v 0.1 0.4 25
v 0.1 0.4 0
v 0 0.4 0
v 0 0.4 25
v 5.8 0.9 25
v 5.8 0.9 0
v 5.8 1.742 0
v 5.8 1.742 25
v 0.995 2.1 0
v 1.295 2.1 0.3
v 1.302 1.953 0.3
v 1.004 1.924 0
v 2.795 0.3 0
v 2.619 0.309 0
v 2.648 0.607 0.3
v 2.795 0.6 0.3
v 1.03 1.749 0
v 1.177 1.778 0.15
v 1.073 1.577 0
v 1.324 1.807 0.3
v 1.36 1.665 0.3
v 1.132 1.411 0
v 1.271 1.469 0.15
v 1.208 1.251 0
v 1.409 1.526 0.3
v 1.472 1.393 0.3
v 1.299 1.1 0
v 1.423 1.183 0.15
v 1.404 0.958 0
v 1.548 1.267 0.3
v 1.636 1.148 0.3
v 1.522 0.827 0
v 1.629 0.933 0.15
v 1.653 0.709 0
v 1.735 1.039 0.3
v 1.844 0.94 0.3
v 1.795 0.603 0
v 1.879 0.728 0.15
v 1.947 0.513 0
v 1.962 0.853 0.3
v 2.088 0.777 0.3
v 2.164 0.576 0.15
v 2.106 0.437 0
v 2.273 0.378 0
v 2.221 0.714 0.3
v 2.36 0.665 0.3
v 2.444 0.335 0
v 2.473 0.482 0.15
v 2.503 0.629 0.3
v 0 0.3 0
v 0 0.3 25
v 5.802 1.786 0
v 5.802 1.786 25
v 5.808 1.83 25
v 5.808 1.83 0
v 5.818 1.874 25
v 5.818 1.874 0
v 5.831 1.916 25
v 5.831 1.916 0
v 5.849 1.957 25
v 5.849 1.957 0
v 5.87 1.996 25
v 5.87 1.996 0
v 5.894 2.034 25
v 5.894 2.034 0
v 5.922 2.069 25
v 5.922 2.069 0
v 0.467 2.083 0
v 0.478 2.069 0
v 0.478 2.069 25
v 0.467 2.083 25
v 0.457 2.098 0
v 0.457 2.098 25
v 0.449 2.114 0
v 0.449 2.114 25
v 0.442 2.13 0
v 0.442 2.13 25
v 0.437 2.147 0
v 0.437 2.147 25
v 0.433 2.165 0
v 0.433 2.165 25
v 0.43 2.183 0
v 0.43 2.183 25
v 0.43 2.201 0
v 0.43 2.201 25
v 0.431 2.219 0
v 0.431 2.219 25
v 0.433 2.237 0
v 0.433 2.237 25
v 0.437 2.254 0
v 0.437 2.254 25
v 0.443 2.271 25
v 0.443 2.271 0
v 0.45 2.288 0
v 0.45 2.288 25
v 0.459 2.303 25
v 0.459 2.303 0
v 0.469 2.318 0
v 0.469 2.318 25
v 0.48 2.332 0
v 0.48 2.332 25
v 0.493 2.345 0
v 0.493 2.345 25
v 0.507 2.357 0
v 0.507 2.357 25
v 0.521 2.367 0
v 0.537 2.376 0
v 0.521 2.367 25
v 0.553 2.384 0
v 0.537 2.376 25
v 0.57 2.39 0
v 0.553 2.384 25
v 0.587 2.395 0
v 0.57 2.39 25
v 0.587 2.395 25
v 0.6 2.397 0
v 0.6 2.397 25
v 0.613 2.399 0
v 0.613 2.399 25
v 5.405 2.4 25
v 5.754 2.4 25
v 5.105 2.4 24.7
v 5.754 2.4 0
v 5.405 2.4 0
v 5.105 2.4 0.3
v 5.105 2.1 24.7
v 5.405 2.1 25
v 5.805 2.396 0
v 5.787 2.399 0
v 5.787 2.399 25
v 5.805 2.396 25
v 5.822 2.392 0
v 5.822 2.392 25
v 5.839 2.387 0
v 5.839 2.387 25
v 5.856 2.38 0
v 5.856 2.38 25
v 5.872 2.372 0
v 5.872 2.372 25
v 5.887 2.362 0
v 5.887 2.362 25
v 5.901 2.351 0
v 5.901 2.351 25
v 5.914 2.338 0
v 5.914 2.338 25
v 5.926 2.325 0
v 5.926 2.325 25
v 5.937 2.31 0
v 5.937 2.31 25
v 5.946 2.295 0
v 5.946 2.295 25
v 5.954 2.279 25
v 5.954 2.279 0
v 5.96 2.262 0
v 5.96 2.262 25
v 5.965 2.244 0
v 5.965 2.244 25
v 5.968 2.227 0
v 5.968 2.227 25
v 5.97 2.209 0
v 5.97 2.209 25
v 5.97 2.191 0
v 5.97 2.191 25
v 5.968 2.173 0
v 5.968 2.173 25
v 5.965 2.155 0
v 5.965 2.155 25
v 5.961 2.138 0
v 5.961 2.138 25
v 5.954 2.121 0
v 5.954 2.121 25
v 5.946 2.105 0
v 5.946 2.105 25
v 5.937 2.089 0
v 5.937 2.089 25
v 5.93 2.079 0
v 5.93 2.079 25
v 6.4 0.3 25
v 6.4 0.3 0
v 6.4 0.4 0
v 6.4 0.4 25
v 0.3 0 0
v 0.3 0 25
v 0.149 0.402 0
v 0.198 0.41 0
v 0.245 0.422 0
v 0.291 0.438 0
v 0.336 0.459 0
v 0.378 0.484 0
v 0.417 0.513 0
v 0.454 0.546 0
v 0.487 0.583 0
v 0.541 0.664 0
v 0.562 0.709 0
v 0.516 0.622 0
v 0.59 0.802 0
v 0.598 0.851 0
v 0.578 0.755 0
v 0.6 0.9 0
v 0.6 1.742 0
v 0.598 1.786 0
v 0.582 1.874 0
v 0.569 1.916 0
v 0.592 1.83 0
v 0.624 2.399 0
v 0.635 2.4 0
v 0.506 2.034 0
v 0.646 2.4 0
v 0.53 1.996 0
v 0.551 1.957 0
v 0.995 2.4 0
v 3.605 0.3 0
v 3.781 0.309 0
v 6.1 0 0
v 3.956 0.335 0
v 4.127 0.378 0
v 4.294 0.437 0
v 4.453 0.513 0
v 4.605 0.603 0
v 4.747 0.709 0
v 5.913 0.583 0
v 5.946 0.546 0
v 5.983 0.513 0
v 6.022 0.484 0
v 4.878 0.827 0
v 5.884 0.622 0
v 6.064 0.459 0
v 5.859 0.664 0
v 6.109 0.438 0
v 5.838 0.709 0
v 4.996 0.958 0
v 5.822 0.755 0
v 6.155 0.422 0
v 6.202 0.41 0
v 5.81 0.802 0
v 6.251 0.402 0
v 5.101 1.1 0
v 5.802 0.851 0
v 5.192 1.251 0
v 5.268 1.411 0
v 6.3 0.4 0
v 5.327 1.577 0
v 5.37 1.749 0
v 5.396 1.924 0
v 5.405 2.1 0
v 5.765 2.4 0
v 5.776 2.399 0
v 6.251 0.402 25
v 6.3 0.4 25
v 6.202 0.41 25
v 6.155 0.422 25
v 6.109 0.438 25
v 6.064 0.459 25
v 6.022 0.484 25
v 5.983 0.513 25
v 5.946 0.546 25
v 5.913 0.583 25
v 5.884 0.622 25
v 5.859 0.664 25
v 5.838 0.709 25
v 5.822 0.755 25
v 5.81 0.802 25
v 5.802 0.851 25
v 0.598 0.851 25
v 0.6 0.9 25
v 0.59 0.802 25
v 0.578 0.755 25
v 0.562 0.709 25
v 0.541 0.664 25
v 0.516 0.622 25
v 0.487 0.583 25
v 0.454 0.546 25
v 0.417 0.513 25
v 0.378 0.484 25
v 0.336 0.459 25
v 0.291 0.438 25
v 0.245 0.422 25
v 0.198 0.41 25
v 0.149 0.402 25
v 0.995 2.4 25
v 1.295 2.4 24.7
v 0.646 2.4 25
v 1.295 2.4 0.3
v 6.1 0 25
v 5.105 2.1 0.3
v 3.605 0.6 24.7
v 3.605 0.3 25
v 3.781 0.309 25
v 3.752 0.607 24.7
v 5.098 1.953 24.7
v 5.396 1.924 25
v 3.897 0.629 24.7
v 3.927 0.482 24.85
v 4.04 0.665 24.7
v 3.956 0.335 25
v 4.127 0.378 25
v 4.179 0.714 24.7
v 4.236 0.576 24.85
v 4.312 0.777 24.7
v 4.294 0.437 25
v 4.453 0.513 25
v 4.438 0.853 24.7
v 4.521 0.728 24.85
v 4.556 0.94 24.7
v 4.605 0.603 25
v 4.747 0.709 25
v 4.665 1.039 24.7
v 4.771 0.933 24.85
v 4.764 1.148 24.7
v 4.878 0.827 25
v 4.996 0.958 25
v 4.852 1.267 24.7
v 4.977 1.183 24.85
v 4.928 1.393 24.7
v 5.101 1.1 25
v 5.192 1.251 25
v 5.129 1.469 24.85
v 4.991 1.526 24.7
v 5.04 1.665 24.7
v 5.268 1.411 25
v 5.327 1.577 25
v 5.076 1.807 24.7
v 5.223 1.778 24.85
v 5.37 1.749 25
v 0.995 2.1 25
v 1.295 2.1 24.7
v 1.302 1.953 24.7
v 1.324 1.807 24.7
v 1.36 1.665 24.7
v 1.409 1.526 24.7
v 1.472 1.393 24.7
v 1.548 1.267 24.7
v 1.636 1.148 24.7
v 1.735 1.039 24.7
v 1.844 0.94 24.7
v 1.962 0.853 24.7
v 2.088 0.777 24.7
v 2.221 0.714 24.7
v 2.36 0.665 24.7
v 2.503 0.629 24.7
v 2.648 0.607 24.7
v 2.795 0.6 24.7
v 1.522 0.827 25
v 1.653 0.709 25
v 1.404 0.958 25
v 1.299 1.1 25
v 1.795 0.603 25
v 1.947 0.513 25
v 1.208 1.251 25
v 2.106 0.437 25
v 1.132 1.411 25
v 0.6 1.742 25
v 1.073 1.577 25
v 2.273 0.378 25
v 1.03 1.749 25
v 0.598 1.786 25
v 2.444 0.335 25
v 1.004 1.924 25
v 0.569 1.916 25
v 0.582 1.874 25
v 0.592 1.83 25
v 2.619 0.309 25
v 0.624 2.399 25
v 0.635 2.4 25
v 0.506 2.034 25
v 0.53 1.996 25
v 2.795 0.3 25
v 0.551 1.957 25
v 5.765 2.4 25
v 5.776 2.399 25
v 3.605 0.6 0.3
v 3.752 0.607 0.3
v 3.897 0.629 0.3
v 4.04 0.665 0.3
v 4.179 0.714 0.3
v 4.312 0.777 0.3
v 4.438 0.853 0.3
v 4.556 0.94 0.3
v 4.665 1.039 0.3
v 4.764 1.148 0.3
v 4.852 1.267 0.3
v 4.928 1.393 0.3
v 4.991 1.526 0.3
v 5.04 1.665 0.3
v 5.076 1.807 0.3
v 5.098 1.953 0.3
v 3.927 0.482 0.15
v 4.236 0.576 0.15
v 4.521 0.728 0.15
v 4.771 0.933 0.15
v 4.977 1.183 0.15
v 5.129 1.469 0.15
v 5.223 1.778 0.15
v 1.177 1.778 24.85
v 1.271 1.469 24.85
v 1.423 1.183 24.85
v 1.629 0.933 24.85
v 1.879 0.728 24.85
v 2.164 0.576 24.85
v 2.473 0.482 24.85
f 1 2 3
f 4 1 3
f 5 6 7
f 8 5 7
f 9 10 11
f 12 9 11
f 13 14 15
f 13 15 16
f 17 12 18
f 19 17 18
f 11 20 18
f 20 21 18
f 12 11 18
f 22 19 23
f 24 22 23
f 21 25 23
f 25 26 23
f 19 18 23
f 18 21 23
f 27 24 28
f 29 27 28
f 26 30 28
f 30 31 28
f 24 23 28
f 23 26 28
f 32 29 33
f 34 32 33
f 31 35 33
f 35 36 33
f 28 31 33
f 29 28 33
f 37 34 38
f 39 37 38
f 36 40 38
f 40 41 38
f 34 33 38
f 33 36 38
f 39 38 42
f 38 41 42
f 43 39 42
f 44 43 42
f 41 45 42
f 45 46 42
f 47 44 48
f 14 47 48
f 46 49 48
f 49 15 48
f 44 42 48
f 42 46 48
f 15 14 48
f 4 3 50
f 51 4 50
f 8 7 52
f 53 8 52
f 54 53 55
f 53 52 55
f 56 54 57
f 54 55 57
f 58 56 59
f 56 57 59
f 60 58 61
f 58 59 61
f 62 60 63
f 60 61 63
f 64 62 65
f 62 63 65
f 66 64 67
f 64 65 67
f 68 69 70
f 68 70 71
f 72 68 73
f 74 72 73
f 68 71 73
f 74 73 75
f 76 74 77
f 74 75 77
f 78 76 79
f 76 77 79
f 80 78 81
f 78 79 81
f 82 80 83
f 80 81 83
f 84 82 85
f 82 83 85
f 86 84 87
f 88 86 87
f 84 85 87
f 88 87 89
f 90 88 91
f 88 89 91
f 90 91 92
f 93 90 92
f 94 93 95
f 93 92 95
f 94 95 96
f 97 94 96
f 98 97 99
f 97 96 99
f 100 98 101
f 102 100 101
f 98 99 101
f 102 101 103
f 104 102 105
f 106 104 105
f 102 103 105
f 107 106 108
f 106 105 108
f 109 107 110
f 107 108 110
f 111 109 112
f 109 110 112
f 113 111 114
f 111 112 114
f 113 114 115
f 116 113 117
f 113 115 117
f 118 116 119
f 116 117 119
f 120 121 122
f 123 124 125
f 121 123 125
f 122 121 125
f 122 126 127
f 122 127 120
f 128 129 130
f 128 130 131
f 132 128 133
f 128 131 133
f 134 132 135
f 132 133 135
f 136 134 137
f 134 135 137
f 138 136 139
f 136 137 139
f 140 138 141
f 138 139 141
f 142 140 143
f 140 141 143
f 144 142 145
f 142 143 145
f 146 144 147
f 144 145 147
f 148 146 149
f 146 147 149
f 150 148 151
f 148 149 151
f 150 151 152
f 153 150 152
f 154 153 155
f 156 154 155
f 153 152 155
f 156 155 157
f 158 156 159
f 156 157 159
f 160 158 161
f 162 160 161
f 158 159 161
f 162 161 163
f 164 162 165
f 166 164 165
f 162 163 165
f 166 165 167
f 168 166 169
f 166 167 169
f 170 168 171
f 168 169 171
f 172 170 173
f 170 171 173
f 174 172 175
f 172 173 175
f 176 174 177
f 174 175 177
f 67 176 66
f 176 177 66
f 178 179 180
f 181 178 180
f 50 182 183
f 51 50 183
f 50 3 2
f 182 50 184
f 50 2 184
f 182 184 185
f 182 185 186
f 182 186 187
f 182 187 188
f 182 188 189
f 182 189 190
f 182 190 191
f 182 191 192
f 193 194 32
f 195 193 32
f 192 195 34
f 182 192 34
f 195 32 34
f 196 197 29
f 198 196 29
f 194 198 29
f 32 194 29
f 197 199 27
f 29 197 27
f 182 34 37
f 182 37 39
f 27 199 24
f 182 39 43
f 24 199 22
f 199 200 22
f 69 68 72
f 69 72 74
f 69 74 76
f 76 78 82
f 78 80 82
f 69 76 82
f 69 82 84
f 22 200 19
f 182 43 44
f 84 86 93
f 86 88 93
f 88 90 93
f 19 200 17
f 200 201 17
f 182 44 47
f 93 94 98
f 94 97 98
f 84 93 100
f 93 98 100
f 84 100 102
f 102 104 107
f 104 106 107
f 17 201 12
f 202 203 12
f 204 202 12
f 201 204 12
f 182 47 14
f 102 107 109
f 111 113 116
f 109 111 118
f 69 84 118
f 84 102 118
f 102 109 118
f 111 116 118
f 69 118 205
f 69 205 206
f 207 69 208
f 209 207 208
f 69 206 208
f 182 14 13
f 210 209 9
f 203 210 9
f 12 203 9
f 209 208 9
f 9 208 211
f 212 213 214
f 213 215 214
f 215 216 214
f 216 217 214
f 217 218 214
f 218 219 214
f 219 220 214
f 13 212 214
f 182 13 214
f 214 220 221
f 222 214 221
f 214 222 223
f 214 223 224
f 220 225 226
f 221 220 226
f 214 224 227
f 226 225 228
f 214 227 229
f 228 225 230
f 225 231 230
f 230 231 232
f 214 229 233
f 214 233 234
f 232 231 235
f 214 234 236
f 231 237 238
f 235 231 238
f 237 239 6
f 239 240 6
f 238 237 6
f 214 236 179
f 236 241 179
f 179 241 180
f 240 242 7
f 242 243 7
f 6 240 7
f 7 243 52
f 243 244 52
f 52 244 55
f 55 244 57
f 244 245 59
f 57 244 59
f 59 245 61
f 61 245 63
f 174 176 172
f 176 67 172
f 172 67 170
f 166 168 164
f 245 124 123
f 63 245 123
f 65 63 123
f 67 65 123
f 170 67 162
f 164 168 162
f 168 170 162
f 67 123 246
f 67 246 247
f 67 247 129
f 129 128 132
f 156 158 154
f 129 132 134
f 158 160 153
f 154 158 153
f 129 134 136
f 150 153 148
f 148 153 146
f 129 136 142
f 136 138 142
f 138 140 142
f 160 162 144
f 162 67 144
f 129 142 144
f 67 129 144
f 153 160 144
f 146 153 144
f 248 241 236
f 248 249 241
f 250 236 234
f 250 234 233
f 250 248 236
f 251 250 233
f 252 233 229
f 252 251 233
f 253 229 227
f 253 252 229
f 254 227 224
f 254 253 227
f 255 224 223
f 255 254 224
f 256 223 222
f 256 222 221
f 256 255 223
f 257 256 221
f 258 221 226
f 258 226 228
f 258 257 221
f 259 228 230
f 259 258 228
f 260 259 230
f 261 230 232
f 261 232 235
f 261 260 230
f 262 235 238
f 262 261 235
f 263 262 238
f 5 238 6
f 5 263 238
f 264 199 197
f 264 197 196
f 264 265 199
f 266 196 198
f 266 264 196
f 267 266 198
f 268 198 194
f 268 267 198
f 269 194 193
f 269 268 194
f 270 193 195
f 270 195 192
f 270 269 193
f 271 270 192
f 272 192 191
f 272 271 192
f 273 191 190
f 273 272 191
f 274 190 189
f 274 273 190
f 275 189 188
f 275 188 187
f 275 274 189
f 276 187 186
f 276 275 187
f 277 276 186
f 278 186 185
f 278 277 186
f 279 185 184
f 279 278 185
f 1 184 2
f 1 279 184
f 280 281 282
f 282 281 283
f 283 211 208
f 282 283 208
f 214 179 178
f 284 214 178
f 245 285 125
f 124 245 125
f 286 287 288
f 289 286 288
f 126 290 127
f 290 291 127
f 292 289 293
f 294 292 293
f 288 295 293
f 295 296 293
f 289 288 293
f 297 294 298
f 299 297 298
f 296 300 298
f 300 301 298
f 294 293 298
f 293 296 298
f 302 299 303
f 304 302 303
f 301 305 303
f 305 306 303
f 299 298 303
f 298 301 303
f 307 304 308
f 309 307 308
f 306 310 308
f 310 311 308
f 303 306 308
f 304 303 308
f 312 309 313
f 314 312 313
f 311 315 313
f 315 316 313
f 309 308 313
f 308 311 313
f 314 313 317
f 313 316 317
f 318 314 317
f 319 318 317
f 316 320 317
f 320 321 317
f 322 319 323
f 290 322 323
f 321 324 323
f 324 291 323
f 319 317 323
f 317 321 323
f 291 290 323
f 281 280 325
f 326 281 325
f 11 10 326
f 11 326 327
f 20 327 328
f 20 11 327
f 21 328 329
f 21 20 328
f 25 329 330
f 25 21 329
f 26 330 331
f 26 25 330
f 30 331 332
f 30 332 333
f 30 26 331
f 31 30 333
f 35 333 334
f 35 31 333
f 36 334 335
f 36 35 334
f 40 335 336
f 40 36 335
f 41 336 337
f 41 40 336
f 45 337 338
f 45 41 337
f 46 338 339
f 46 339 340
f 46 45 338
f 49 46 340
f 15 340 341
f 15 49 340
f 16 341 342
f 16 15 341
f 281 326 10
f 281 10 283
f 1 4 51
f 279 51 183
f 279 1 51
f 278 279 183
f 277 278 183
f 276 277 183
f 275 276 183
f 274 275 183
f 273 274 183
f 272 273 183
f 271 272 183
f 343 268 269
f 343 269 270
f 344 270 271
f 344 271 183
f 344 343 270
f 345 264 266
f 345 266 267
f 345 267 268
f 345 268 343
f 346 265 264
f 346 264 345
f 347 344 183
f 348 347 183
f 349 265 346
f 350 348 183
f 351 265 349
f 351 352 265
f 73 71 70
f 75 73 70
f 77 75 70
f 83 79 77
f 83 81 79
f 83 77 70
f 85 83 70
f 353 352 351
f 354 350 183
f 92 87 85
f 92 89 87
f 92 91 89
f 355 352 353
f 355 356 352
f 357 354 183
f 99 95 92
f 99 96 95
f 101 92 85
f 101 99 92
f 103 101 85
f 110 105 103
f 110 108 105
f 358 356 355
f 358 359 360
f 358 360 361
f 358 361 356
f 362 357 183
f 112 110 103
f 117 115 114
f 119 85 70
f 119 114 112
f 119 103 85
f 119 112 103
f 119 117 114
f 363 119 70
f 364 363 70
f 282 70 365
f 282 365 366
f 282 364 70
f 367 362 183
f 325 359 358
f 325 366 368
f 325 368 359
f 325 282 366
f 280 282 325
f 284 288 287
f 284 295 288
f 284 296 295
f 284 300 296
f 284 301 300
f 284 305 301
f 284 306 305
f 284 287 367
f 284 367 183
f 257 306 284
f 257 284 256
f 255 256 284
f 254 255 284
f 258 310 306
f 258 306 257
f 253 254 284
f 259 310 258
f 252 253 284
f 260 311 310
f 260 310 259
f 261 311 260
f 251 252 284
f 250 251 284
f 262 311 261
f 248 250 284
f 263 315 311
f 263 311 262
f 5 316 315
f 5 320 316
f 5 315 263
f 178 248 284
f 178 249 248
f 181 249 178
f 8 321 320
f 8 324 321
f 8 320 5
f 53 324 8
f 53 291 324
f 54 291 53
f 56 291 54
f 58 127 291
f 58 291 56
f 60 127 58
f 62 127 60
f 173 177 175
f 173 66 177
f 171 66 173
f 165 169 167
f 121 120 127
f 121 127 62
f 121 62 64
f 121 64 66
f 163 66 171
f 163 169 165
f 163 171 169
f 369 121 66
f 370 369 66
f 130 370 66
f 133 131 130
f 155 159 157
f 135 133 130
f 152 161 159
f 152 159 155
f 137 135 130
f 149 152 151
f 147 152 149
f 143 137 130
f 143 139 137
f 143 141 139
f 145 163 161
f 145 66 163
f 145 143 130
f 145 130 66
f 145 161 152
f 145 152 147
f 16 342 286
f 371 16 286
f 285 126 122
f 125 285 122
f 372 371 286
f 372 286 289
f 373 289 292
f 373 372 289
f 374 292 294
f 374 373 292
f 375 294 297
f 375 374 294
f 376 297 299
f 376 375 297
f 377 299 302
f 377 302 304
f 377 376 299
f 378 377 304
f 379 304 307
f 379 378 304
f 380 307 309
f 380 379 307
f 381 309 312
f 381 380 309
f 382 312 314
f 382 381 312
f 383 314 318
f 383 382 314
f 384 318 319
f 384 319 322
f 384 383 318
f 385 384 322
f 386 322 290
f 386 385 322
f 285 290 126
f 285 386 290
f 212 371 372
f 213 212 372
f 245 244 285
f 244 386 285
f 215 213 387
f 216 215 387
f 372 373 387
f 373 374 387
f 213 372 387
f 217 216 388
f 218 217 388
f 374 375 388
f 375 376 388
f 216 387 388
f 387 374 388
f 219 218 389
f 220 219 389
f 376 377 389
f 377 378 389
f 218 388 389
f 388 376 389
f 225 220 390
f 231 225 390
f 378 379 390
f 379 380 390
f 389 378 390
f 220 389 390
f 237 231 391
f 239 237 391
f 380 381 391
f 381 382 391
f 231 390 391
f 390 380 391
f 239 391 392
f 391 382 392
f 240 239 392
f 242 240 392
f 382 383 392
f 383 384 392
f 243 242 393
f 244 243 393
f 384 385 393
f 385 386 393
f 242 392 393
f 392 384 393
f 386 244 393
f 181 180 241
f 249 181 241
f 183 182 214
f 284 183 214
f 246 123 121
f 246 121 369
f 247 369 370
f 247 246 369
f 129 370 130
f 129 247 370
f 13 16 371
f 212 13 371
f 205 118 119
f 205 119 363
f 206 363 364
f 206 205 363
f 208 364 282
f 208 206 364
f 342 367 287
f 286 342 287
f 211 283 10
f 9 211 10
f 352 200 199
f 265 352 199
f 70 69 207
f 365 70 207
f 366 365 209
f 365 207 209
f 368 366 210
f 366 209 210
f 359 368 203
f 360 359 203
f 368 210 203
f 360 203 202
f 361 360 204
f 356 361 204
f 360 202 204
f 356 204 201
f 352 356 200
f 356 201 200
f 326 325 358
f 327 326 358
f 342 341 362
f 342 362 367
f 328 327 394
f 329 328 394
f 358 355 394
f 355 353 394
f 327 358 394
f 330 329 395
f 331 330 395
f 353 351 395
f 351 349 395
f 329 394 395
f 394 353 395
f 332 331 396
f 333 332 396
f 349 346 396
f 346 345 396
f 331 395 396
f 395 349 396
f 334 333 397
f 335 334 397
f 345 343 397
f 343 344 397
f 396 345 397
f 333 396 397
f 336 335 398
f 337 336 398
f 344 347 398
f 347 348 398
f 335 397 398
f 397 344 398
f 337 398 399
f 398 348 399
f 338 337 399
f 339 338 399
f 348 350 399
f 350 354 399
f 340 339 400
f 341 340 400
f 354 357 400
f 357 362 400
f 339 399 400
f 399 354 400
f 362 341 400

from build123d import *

# Parameters (mm, degrees)
F1_DEPTH    = 25
F2_T1_DEPTH = 25
F3_R        = 0.5
F4_T1_DEPTH = 26.7320508076
F5_R        = 0.2
F6_W        = 3.8095204468
F6_H        = 1.8
F7_DEPTH    = 25.0010001
F8_R        = 1.5
F9_SIZE     = 0.3


# Not quite as in the source:
# - a fillet or chamfer that OpenCascade refuses, or shapes differently, is made with other operations: its cross-section is extruded or revolved along the edge and cut away or added


with BuildPart() as f1:
    # F0 (on Top) → F1 (new body)
    with BuildSketch(Plane.XY):
        Polygon((0, 0.4), (0, 0), (6.4, 0), (6.4, 0.4), (5.8, 0.4), (5.8, 2.2), (6.1, 2.2), (6.1, 2.4), (0.3, 2.4), (0.3, 2.2), (0.6, 2.2), (0.6, 0.4), align=None)
    extrude(amount=F1_DEPTH)

    # F2: fillet of radius 0.5 on 2 edges, made by hand

    # F2_s2 → F2_t1 (join)
    with BuildSketch(Plane.XY):
        with BuildLine():
            ThreePointArc((0.3, 2.2), (0.5183300133, 2.0156037093), (0.6, 1.7417424305))
            Line((0.6, 1.7417424305), (0.6, 2.2))
            Line((0.6, 2.2), (0.3, 2.2))
        make_face()
        with BuildLine():
            ThreePointArc((5.8, 1.7417424305), (5.8816699867, 2.0156037093), (6.1, 2.2))
            Line((6.1, 2.2), (5.8, 2.2))
            Line((5.8, 2.2), (5.8, 1.7417424305))
        make_face()
    extrude(amount=F2_T1_DEPTH)

    # F3
    f3_edges = [f1.edges().sort_by_distance(p)[0] for p in [
        (5.8, 0.4, 12.5),
        (0.6, 0.4, 12.5),
    ]]
    fillet(f3_edges, radius=F3_R)

    # F4: fillet of radius 0.4 on 2 edges, made by hand

    # F4_s2 → F4_t1 (cut)
    with BuildSketch(Plane.XY.offset(-0.8660254038)):
        with BuildLine():
            ThreePointArc((0.3, 2.2), (0.4464101615, 2.3464101615), (0.6464101615, 2.4))
            Line((0.6464101615, 2.4), (0.3, 2.4))
            Line((0.3, 2.4), (0.3, 2.2))
        make_face()
        with BuildLine():
            ThreePointArc((5.7535898385, 2.4), (5.9535898385, 2.3464101615), (6.1, 2.2))
            Line((6.1, 2.2), (6.1, 2.4))
            Line((6.1, 2.4), (5.7535898385, 2.4))
        make_face()
    extrude(amount=F4_T1_DEPTH, mode=Mode.SUBTRACT)

    # F5
    f5_edges = [f1.edges().sort_by_distance(p)[0] for p in [
        (0.3, 2.2, 12.5),
        (6.1, 2.2, 12.5),
    ]]
    fillet(f5_edges, radius=F5_R)

    # F6 (on face) → F7 (cut, through all)
    with BuildSketch(Plane.XY.offset(25)):
        with Locations((3.2, 1.5)):
            Rectangle(F6_W, F6_H)
    extrude(amount=-F7_DEPTH, mode=Mode.SUBTRACT)

    # F8
    f8_edges = [f1.edges().sort_by_distance(p)[0] for p in [
        (1.29524, 0.6, 12.5),
        (5.10476, 0.6, 12.5),
    ]]
    fillet(f8_edges, radius=F8_R)

    # F9
    f9_edges = [f1.edges().sort_by_distance(p)[0] for p in [
        (3.2, 0.6, 25),
        (2.79524, 0.6, 12.5),
        (3.60476, 0.6, 12.5),
        (3.2, 0.6, 0),
        (6.4, 0, 12.5),
        (0, 0, 12.5),
        (1.29524, 2.25, 0),
        (1.73458, 1.03934, 0),
        (4.66542, 1.03934, 0),
        (5.10476, 2.25, 0),
        (1.29524, 2.25, 25),
        (1.73458, 1.03934, 25),
        (4.66542, 1.03934, 25),
        (5.10476, 2.25, 25),
    ]]
    chamfer(f9_edges, length=F9_SIZE)


solid = f1.part
